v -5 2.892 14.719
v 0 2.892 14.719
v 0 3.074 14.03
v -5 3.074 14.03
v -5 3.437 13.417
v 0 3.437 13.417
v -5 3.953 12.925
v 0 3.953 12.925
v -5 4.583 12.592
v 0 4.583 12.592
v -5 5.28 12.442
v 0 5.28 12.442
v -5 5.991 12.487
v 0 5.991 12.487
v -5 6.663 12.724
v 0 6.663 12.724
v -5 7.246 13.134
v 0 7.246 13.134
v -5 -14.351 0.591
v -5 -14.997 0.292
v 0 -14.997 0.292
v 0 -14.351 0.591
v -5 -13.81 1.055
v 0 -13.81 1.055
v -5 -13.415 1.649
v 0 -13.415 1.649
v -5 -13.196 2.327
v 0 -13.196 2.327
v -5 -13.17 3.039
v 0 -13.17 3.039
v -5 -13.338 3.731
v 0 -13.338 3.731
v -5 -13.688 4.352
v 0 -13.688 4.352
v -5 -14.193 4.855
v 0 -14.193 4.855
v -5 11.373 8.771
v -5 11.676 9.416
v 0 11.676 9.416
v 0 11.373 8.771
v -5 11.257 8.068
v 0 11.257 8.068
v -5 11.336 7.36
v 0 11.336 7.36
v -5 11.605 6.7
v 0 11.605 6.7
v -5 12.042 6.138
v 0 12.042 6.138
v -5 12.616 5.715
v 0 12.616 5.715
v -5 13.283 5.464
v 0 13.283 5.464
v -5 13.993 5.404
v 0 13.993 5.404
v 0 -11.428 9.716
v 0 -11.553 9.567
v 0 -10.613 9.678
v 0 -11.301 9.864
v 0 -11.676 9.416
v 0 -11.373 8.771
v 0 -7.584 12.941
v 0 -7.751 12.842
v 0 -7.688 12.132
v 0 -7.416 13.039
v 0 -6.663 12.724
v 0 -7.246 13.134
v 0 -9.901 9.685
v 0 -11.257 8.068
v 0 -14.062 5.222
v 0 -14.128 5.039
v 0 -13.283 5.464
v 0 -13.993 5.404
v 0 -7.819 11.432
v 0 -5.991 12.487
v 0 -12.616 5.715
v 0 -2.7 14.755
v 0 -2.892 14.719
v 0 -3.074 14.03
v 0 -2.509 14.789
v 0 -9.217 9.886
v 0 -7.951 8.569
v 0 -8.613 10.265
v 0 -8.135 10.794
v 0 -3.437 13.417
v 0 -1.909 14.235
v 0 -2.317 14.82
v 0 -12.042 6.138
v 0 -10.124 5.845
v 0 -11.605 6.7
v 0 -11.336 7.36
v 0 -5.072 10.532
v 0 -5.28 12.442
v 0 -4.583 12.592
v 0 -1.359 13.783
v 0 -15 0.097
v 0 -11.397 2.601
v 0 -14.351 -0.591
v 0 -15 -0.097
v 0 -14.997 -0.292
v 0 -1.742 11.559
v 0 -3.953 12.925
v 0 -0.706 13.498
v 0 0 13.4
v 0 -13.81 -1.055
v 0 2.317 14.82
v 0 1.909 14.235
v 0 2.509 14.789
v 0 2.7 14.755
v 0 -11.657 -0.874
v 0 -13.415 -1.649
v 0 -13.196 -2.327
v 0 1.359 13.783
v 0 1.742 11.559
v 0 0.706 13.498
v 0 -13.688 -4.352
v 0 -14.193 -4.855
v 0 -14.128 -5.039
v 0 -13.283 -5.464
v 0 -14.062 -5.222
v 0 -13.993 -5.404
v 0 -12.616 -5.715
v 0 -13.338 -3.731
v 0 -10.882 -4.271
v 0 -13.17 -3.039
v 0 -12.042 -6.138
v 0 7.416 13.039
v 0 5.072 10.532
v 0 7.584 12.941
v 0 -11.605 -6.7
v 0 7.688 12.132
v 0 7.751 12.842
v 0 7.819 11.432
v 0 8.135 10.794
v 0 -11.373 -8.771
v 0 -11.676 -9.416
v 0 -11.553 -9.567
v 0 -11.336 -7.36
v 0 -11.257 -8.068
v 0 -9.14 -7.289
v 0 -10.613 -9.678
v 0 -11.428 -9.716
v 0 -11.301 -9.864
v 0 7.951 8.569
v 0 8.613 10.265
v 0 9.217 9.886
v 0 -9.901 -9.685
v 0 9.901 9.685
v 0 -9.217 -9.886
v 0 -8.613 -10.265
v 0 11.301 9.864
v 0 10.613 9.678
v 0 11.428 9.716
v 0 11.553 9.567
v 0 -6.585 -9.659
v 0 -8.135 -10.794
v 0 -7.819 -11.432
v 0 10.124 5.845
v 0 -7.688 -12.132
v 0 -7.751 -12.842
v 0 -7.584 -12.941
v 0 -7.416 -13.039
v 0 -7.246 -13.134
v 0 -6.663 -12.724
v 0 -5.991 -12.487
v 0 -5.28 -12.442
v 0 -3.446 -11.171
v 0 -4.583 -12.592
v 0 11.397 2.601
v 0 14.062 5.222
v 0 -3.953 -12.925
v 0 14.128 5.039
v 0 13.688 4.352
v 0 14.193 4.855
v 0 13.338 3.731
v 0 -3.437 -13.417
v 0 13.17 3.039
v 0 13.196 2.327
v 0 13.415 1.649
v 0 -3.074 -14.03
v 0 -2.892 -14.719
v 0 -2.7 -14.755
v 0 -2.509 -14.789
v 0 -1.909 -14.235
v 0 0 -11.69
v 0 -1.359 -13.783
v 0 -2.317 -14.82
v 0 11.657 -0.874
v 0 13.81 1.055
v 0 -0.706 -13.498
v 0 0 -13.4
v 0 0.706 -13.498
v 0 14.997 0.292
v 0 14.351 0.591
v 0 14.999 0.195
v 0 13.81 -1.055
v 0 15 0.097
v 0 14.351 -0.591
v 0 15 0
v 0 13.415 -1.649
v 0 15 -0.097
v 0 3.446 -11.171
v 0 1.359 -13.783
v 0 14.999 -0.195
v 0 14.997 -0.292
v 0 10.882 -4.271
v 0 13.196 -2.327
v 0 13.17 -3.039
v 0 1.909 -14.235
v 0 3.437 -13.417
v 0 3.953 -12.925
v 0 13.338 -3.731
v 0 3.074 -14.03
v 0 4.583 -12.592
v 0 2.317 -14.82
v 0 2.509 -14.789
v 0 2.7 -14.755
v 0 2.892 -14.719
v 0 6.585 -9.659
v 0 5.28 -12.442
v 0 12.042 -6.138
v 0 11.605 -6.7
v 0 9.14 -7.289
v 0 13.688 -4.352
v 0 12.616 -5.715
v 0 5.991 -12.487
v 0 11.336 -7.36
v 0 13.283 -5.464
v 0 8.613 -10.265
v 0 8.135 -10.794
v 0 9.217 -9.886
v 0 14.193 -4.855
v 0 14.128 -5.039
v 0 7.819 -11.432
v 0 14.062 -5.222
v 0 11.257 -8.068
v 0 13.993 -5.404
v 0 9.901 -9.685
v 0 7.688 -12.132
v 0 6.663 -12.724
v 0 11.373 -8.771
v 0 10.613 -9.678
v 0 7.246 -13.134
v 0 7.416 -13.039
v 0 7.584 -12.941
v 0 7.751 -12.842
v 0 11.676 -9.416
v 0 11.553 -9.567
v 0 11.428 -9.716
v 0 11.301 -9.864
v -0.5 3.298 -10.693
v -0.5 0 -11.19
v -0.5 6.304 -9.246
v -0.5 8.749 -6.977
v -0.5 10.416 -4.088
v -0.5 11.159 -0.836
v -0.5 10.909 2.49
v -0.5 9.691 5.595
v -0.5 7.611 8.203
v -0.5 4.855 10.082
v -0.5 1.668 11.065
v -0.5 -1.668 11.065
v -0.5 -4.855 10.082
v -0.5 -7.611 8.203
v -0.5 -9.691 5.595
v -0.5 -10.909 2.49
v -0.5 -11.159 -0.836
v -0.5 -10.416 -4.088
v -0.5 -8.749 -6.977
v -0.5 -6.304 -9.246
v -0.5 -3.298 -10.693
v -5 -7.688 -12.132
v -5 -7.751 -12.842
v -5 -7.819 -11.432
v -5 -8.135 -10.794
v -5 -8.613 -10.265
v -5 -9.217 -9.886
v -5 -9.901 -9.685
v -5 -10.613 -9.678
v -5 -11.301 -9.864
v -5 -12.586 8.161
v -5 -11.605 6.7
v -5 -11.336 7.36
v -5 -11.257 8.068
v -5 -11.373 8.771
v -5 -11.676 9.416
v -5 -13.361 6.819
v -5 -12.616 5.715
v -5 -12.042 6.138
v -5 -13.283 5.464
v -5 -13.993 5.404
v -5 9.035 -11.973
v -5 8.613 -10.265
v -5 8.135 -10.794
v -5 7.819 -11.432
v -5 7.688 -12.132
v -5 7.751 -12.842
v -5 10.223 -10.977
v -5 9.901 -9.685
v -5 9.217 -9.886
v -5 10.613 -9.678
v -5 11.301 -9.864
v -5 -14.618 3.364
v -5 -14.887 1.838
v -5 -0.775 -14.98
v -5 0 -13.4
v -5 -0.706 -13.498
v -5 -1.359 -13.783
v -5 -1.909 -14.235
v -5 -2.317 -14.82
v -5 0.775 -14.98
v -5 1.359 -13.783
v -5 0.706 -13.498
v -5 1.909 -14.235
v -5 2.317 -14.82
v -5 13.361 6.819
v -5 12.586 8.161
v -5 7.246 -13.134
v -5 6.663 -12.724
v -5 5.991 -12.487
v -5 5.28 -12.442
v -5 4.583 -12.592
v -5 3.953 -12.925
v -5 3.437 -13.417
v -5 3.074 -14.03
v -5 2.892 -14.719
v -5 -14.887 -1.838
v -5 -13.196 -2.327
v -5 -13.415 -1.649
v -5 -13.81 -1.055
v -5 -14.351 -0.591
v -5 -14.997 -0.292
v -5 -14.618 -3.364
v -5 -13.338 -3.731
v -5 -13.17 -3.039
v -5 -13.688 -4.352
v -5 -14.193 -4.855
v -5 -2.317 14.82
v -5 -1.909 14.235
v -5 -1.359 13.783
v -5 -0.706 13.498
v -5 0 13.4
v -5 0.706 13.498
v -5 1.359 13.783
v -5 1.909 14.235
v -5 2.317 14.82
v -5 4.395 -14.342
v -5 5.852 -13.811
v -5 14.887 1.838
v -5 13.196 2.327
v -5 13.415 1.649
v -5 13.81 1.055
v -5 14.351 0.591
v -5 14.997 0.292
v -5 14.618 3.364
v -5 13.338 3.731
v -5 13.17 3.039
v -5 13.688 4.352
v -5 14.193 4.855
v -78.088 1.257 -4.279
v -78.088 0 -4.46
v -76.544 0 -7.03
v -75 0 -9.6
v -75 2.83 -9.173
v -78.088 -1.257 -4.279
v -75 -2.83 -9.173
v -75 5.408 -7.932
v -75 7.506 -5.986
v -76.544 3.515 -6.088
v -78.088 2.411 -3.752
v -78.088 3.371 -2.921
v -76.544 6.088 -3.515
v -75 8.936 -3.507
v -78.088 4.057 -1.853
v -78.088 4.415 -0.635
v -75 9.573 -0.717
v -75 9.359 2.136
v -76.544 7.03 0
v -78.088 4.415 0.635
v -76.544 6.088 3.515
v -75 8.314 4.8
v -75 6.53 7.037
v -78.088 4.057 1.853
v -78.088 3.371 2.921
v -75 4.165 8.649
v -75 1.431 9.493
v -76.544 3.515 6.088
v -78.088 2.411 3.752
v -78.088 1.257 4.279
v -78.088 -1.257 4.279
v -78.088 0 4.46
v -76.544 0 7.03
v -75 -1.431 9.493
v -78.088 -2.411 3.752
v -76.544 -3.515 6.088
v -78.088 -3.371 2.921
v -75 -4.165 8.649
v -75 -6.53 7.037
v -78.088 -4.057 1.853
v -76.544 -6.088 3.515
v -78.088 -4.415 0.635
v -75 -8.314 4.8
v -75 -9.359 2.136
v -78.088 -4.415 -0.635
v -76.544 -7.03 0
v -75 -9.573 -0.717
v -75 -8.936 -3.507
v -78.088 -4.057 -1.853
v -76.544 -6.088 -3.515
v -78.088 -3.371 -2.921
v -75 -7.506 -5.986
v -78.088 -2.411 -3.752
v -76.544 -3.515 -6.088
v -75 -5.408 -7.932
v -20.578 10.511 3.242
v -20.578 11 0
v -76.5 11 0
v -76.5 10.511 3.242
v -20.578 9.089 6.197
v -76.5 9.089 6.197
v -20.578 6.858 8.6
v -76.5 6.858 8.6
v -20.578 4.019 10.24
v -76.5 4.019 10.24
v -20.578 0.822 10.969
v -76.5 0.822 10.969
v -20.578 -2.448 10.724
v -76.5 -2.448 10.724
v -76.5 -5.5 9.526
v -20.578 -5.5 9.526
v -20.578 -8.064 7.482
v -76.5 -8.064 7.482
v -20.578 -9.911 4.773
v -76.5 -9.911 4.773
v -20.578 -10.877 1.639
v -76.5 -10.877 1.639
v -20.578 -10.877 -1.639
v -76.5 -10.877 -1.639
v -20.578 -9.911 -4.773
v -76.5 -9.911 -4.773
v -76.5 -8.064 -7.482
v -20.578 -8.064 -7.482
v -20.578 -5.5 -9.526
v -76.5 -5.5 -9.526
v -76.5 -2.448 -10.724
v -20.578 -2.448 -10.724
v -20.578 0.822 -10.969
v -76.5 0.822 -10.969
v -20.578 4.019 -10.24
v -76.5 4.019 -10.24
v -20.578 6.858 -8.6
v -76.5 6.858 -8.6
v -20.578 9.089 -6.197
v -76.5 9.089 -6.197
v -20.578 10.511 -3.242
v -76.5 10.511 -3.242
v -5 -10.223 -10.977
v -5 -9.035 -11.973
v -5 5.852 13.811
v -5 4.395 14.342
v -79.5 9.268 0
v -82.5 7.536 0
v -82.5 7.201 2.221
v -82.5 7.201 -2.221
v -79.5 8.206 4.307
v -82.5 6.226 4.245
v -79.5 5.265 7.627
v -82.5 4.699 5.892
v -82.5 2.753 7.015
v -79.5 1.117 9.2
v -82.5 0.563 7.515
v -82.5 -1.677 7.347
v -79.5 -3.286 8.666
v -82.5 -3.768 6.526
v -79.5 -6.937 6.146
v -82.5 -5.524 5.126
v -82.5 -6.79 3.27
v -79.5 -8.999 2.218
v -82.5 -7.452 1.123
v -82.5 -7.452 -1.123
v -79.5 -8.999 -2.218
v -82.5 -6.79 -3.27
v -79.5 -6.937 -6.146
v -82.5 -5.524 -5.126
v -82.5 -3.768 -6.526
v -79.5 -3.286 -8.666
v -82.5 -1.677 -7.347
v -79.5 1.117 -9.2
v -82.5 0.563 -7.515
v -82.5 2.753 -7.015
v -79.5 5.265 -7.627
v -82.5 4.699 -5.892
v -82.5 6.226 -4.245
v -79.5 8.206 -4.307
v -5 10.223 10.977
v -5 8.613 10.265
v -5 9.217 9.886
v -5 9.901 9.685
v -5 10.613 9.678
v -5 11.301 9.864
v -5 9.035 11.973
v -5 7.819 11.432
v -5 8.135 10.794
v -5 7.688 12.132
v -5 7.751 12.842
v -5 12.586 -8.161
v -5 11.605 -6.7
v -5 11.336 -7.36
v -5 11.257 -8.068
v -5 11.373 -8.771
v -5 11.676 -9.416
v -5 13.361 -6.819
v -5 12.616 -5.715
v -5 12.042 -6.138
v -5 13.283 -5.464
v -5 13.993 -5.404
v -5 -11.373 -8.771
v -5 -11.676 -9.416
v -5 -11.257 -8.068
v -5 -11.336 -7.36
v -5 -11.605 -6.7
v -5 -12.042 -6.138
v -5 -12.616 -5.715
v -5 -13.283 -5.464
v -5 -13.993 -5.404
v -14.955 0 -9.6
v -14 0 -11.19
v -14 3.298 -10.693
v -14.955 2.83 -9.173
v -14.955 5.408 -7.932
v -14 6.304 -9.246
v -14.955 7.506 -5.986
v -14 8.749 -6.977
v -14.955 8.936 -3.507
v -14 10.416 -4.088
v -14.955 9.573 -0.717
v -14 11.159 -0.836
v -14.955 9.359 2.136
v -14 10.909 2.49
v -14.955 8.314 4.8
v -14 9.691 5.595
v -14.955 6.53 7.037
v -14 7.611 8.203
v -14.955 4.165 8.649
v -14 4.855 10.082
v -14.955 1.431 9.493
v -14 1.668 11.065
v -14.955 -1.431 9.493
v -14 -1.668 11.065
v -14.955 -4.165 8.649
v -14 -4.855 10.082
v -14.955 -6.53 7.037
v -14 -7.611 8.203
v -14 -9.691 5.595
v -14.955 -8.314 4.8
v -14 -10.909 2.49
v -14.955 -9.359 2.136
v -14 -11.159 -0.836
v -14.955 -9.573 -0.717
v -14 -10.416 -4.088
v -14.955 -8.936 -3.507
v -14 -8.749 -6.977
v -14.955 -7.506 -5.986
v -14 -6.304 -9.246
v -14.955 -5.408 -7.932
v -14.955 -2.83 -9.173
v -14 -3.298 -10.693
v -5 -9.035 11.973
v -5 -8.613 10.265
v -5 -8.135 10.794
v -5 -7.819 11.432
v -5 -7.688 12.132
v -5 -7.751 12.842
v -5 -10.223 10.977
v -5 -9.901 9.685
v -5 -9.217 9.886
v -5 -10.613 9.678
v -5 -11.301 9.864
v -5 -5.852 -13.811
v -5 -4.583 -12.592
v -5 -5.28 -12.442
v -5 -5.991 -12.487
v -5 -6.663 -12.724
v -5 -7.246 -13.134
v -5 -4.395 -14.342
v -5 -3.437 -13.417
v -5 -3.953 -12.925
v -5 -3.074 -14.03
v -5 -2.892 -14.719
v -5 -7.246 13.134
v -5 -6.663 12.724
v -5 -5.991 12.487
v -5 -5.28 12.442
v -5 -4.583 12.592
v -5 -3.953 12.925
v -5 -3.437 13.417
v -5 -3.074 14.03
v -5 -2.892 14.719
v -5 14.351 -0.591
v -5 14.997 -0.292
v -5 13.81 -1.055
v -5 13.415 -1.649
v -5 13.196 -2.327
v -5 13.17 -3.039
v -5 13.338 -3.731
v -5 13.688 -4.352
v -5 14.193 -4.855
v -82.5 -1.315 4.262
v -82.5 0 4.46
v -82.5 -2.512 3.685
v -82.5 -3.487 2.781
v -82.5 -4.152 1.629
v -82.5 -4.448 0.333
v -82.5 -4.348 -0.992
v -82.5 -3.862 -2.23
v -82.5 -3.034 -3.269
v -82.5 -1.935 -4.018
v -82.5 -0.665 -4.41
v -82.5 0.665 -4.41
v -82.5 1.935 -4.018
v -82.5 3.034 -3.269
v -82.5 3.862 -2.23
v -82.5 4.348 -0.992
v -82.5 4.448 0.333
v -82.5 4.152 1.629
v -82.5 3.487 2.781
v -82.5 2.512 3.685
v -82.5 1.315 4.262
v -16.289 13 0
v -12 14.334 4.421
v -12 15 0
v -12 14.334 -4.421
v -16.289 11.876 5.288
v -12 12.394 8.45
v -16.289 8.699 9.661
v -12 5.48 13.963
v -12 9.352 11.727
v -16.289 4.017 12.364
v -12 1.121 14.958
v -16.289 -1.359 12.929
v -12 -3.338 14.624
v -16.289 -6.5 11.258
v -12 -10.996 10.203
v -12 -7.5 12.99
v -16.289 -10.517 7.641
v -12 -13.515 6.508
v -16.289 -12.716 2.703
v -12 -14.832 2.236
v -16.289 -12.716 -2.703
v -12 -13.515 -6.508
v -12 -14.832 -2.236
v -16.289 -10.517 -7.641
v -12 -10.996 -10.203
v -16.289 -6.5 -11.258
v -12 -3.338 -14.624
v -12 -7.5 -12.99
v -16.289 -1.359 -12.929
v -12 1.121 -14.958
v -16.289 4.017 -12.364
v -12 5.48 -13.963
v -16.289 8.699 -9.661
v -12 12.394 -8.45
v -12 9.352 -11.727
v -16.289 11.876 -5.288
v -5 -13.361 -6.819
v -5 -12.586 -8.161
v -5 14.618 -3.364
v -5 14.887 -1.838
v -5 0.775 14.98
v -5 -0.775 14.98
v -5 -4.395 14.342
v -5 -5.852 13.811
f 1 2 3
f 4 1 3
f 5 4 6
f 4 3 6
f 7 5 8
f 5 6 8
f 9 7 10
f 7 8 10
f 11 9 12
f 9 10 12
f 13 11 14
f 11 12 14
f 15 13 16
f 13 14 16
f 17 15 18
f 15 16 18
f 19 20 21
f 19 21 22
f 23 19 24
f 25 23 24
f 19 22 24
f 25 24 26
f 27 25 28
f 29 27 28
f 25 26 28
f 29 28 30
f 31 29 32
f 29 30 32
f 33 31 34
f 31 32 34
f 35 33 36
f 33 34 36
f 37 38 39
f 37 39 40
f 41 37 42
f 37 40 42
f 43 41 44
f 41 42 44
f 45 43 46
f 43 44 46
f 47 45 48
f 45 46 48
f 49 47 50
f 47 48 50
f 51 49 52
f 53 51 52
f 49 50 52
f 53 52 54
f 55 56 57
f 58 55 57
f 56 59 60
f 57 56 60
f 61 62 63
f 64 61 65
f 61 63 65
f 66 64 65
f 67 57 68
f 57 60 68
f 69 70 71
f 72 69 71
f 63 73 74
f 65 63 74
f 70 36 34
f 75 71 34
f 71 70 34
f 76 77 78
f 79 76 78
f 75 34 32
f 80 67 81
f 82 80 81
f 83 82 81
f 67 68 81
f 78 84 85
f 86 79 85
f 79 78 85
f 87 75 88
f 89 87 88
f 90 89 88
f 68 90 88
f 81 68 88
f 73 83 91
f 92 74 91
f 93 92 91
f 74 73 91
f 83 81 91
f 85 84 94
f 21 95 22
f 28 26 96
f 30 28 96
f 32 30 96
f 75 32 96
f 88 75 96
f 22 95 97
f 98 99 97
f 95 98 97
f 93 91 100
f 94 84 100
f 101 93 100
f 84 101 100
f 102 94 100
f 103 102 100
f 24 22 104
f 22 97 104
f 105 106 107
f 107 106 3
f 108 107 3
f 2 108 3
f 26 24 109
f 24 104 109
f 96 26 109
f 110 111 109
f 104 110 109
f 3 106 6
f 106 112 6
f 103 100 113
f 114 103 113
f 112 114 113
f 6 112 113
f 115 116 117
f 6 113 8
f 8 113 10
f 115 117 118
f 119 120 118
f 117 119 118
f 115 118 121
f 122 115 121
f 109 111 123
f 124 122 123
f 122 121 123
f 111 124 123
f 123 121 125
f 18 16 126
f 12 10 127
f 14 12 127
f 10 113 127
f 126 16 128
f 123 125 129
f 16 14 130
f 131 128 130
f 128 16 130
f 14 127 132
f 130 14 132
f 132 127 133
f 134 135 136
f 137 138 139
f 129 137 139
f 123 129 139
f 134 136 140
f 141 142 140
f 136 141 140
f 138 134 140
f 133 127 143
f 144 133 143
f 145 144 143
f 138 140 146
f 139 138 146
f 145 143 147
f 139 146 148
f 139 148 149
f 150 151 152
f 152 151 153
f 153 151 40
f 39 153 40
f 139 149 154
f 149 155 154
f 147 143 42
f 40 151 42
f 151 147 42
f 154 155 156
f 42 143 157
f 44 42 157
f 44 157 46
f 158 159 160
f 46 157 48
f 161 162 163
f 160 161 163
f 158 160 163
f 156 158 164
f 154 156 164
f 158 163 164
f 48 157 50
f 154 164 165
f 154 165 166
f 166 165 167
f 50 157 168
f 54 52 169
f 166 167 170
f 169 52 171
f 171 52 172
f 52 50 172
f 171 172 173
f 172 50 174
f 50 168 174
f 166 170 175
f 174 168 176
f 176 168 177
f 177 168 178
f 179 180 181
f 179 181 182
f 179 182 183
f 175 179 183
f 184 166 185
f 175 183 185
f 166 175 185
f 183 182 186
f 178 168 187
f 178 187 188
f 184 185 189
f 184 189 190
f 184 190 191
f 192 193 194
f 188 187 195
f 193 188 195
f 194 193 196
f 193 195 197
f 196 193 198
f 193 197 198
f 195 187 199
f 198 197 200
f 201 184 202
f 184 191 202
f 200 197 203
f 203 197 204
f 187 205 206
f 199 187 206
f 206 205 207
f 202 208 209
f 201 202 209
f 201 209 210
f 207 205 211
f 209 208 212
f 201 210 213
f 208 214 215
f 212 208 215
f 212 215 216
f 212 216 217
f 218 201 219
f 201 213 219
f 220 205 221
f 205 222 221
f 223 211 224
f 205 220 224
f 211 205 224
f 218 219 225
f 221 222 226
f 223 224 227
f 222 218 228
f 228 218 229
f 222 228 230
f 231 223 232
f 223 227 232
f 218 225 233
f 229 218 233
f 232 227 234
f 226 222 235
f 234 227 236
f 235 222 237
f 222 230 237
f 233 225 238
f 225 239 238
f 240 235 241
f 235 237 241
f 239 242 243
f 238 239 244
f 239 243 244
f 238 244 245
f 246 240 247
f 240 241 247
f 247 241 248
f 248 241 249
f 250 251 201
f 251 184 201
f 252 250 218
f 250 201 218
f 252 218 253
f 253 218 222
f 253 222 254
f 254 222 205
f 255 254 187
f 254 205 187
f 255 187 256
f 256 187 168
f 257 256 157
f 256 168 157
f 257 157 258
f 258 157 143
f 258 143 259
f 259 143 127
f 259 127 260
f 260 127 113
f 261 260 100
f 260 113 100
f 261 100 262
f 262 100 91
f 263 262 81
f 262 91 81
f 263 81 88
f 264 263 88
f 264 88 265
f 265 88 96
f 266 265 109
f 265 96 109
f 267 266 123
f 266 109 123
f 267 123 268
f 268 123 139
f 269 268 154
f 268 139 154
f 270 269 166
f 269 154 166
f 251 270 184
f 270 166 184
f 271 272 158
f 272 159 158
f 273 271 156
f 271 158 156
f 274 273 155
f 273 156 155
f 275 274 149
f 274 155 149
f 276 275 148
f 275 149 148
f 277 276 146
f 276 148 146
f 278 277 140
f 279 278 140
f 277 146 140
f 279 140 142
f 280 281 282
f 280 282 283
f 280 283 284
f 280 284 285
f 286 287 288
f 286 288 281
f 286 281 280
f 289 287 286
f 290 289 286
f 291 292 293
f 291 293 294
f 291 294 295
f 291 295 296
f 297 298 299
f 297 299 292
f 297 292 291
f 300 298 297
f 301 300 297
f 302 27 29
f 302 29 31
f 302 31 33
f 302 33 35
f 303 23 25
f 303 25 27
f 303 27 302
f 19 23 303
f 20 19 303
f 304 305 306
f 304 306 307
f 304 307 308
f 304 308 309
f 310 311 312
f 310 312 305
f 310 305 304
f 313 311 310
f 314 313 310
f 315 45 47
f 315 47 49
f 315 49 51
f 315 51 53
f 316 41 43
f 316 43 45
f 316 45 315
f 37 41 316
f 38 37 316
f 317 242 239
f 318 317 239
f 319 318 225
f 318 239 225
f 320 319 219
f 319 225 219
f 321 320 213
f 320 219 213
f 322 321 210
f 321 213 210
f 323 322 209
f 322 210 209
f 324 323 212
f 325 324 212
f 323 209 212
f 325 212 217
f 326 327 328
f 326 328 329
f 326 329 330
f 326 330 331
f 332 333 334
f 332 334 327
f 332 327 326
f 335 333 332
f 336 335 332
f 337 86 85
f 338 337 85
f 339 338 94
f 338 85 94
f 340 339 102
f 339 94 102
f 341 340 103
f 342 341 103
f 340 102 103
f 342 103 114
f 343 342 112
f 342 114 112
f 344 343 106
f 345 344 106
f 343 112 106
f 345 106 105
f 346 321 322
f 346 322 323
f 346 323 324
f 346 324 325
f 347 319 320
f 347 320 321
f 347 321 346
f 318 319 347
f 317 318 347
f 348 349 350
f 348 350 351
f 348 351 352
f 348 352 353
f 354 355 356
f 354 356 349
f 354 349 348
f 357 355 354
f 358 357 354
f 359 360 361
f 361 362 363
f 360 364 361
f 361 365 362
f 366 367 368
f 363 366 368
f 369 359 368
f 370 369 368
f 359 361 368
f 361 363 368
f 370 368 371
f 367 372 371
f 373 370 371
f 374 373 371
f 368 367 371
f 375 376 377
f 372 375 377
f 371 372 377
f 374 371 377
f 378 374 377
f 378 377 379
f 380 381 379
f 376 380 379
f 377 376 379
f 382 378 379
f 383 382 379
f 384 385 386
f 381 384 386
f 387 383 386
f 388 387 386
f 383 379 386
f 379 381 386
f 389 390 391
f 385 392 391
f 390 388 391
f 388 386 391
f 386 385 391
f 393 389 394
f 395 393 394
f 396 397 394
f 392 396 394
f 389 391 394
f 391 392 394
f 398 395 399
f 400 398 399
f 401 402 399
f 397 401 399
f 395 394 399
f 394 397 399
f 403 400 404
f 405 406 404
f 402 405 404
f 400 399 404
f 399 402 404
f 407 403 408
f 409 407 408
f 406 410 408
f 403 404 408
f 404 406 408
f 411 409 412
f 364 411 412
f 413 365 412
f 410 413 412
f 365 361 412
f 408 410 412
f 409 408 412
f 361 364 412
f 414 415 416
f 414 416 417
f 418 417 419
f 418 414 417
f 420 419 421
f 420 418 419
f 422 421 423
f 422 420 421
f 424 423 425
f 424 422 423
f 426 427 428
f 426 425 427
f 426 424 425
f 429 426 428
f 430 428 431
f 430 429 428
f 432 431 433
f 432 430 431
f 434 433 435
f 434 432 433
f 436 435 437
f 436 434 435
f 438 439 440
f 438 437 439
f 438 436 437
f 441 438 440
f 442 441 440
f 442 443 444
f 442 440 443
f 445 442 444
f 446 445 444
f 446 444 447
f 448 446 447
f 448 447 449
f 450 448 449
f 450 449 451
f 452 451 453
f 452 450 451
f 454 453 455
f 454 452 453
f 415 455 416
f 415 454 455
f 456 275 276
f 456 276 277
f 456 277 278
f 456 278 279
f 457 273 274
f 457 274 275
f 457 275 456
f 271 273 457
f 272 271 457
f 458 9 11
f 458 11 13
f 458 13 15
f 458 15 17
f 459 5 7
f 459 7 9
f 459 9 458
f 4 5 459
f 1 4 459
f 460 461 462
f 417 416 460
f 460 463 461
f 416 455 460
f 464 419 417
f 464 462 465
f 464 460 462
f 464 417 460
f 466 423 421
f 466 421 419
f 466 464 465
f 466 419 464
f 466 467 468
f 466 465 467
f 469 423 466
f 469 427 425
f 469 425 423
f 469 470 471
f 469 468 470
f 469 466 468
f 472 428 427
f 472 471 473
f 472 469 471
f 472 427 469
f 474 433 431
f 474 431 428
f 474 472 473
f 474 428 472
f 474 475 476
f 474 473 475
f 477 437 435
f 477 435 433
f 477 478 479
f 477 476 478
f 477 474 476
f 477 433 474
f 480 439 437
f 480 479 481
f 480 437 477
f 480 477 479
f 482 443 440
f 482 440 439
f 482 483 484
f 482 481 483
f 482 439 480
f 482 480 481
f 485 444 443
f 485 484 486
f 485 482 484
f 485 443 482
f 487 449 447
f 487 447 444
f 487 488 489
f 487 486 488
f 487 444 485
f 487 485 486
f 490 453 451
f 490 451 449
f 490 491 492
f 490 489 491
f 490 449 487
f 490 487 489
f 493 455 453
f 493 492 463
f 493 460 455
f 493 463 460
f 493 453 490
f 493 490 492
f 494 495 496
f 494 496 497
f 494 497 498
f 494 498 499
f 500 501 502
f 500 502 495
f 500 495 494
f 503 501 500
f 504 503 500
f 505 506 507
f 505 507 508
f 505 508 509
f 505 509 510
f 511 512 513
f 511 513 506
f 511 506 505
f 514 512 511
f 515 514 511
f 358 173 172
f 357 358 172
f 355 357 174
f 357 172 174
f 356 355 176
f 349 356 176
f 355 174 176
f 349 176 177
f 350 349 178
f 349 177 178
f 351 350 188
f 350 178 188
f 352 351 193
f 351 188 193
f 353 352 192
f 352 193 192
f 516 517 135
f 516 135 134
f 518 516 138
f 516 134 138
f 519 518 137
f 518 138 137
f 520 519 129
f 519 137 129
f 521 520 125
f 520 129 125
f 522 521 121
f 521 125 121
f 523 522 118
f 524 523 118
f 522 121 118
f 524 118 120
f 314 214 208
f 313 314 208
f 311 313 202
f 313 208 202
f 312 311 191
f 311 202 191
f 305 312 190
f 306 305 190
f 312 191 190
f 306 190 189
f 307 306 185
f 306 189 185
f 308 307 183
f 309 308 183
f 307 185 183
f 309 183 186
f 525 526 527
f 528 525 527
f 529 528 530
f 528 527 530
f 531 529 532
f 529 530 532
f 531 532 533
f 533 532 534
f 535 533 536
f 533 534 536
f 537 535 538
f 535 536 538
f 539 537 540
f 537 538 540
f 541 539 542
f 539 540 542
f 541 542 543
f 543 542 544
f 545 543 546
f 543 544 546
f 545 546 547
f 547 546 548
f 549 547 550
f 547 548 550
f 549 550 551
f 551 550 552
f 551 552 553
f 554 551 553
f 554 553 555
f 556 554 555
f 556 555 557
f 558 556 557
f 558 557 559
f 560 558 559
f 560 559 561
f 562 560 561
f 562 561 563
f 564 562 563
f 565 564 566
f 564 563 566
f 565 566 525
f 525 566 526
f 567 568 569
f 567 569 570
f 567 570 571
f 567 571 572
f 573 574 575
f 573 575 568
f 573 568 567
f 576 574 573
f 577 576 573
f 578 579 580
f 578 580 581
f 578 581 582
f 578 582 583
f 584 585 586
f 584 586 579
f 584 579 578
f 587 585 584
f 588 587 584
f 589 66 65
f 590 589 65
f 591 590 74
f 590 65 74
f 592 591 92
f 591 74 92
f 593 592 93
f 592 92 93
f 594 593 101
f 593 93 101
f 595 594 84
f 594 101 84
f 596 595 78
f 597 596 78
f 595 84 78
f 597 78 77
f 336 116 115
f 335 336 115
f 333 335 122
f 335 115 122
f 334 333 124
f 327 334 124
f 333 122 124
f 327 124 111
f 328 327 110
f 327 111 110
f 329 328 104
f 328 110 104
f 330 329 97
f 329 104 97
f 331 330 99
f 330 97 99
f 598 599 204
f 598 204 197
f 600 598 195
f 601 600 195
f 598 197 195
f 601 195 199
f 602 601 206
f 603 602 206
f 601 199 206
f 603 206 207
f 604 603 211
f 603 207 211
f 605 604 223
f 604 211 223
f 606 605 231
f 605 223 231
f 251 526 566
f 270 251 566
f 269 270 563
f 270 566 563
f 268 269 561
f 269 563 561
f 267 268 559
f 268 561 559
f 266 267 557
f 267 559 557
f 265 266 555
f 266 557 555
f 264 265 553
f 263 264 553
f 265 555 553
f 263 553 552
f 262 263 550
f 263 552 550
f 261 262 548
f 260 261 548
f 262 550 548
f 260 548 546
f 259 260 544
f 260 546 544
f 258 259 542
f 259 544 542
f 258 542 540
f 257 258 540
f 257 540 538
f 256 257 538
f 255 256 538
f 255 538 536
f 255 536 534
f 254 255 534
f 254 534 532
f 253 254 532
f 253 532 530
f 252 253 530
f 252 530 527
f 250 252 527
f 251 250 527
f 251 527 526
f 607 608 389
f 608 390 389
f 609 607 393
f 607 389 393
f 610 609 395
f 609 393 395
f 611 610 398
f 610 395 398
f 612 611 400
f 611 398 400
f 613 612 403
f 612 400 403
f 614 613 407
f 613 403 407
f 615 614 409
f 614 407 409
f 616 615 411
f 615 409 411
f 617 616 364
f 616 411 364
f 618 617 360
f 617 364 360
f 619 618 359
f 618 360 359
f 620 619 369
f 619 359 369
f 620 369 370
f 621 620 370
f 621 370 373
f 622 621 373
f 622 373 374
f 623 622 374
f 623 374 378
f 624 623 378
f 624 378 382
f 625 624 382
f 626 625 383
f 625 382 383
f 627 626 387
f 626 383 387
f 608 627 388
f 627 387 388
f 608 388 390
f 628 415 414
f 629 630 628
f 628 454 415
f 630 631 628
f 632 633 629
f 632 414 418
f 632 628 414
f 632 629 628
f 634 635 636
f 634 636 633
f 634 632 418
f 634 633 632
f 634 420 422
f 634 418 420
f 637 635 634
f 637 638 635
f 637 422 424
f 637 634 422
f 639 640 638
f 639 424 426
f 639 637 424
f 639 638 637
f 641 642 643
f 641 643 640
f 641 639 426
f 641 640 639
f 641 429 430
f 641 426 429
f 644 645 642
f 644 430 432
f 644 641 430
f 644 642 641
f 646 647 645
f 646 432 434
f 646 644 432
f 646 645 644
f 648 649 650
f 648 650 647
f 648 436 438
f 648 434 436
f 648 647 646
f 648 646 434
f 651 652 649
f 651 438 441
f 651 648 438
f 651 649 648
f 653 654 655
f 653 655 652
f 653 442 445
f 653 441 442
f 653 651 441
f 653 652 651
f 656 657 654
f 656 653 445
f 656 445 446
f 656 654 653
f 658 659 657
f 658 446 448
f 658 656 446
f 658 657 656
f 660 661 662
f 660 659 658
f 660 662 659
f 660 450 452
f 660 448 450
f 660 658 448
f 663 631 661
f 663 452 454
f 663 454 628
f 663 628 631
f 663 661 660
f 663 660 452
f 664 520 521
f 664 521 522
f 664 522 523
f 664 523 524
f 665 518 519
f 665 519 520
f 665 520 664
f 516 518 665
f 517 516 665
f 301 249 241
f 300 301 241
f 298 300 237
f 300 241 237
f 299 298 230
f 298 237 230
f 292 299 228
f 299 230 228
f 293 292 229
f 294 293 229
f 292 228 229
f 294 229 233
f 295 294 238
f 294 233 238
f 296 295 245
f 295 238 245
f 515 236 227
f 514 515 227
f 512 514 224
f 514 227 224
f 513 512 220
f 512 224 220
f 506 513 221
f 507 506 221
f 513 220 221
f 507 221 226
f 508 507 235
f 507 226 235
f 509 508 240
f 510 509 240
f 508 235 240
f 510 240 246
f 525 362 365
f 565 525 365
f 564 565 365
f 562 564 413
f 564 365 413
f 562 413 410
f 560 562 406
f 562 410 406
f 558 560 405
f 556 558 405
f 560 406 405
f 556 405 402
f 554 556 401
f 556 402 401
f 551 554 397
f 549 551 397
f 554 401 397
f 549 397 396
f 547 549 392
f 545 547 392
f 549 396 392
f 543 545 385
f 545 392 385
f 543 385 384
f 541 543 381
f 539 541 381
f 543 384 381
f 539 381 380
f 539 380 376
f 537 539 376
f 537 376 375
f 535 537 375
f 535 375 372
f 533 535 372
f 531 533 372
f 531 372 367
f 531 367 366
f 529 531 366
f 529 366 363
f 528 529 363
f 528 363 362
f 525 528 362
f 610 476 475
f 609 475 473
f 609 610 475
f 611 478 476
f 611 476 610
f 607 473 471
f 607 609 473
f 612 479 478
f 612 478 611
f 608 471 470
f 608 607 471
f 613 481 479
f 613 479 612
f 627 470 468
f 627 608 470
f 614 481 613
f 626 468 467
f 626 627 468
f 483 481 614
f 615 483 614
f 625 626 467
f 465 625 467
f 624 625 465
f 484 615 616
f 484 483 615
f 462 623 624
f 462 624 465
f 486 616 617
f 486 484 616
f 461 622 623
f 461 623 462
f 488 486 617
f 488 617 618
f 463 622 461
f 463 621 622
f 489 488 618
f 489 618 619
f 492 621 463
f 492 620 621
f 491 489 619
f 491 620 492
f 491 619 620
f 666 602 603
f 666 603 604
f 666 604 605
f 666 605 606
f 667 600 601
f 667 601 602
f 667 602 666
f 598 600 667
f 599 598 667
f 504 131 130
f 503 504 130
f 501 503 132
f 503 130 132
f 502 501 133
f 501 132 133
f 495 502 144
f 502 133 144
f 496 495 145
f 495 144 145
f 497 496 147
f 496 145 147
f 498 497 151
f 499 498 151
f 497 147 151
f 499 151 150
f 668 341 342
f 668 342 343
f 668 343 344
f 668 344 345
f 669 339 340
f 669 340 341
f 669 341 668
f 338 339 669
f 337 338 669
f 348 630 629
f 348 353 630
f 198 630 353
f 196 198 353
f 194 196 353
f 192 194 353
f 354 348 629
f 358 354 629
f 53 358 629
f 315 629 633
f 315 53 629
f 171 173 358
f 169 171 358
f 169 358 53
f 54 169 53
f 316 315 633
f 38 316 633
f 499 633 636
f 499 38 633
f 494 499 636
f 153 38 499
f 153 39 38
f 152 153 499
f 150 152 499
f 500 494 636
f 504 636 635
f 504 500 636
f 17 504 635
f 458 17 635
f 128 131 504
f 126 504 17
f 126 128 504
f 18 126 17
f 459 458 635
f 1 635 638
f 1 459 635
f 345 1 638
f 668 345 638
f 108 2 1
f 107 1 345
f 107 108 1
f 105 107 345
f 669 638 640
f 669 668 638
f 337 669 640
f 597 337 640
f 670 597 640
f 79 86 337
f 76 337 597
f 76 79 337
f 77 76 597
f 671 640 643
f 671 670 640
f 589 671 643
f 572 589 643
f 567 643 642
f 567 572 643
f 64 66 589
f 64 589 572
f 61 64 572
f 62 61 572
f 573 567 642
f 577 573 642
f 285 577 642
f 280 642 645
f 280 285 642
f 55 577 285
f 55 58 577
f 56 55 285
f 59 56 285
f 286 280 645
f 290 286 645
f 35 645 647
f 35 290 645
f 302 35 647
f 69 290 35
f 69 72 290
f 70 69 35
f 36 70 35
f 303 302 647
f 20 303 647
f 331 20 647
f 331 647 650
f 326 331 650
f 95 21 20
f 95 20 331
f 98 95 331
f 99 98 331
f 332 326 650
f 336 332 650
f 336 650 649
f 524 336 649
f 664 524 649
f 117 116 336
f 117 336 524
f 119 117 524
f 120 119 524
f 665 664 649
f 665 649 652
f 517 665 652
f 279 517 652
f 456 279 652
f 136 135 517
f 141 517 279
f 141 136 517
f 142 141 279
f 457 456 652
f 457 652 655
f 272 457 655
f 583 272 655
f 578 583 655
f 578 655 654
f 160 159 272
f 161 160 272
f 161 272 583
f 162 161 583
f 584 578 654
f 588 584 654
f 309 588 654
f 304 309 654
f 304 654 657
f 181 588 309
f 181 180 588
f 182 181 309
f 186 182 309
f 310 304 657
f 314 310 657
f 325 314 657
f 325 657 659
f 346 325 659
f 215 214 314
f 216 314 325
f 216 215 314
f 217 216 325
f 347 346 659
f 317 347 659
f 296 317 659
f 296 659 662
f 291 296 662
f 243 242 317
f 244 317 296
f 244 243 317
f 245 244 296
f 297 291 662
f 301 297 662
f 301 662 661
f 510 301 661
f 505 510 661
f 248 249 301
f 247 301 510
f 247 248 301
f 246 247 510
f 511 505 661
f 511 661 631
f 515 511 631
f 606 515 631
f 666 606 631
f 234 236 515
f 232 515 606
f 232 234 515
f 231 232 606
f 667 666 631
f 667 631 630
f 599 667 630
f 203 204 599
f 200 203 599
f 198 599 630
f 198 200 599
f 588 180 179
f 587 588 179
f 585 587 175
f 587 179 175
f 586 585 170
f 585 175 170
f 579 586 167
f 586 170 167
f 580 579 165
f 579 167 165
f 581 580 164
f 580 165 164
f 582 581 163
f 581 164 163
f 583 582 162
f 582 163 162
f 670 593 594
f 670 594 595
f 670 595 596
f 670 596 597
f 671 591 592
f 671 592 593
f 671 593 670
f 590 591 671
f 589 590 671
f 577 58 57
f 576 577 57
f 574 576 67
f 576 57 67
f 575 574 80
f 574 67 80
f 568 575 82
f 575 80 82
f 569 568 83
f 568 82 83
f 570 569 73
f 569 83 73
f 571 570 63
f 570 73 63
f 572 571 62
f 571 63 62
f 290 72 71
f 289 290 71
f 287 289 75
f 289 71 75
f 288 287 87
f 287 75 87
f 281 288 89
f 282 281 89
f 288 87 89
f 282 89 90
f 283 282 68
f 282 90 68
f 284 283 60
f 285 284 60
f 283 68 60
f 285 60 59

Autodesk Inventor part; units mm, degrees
ref_plane "YZ Plane" through (0, 0, 0) normal (1, 0, 0) x (0, 1, 0)
ref_plane "XZ Plane" through (0, 0, 0) normal (0, 1, 0) x (-1, 0, 0)
ref_plane "XY Plane" through (0, 0, 0) normal (0, 0, 1) x (1, 0, 0)
sketch "Náčrt1" plane through (0, 0, 0) normal (0, 0, 1) x (1, 0, 0)
  line L0 (0, 0) -> (-82.5, 0)
  line L1 (-82.5, 0) -> (-82.5, 11)
  line L2 (-82.5, 11) -> (-20.578, 11)
  line L3 (-20.578, 11) -> (-12, 15)
  line L4 (-12, 15) -> (0, 15)
  line L5 (0, 15) -> (0, 0)
  dimension "d2" = 22
  dimension "d3" = 30
  dimension "d4" = 12
  dimension "d5" = 25
  dimension "d6" = 82.5
revolve "Rotace1" add sketch "Náčrt1" angle 360 about axis through (0, 0, 0) along (-1, 0, 0)
hole "Díra1" at (0, 0, 0) direction (-1, 0, 0) diameter 22.38 depth 14 tip angle 118
hole "Díra2" at (0, 0, 0) direction (-1, 0, 0) diameter 19.2 depth 75 tip angle 118
hole "Díra3" at (-82.5, 0, 0) direction (1, 0, 0) diameter 8.92 depth 12 tip angle 118
chamfer "Zkosení1" distance 6 angle 30 1 edges at (-82.5, -11, 0) measured on face at (-41.2187, 10.8576, 1.7645)
sketch "Náčrt2" plane through (0, 0, 0) normal (1, 0, 0) x (0, 0, -1)
  circle A0 centre (16, 0) radius 2.6
  point P0 (0, 0)
  dimension "d40" = 16
  dimension "d41" = 5.2
extrude "Vysunutí1" cut sketch "Náčrt2" against normal blind 5
pattern_circular "Kruhové pole1" count 18 over 360 about axis through (-6, 0, 0) along (1, 0, 0) of "Vysunutí1"
chamfer "Zkosení2" distance 0.5 angle 45 1 edges at (0, 0, 11.19)
properties part number "Head01" material "ETG 100"
